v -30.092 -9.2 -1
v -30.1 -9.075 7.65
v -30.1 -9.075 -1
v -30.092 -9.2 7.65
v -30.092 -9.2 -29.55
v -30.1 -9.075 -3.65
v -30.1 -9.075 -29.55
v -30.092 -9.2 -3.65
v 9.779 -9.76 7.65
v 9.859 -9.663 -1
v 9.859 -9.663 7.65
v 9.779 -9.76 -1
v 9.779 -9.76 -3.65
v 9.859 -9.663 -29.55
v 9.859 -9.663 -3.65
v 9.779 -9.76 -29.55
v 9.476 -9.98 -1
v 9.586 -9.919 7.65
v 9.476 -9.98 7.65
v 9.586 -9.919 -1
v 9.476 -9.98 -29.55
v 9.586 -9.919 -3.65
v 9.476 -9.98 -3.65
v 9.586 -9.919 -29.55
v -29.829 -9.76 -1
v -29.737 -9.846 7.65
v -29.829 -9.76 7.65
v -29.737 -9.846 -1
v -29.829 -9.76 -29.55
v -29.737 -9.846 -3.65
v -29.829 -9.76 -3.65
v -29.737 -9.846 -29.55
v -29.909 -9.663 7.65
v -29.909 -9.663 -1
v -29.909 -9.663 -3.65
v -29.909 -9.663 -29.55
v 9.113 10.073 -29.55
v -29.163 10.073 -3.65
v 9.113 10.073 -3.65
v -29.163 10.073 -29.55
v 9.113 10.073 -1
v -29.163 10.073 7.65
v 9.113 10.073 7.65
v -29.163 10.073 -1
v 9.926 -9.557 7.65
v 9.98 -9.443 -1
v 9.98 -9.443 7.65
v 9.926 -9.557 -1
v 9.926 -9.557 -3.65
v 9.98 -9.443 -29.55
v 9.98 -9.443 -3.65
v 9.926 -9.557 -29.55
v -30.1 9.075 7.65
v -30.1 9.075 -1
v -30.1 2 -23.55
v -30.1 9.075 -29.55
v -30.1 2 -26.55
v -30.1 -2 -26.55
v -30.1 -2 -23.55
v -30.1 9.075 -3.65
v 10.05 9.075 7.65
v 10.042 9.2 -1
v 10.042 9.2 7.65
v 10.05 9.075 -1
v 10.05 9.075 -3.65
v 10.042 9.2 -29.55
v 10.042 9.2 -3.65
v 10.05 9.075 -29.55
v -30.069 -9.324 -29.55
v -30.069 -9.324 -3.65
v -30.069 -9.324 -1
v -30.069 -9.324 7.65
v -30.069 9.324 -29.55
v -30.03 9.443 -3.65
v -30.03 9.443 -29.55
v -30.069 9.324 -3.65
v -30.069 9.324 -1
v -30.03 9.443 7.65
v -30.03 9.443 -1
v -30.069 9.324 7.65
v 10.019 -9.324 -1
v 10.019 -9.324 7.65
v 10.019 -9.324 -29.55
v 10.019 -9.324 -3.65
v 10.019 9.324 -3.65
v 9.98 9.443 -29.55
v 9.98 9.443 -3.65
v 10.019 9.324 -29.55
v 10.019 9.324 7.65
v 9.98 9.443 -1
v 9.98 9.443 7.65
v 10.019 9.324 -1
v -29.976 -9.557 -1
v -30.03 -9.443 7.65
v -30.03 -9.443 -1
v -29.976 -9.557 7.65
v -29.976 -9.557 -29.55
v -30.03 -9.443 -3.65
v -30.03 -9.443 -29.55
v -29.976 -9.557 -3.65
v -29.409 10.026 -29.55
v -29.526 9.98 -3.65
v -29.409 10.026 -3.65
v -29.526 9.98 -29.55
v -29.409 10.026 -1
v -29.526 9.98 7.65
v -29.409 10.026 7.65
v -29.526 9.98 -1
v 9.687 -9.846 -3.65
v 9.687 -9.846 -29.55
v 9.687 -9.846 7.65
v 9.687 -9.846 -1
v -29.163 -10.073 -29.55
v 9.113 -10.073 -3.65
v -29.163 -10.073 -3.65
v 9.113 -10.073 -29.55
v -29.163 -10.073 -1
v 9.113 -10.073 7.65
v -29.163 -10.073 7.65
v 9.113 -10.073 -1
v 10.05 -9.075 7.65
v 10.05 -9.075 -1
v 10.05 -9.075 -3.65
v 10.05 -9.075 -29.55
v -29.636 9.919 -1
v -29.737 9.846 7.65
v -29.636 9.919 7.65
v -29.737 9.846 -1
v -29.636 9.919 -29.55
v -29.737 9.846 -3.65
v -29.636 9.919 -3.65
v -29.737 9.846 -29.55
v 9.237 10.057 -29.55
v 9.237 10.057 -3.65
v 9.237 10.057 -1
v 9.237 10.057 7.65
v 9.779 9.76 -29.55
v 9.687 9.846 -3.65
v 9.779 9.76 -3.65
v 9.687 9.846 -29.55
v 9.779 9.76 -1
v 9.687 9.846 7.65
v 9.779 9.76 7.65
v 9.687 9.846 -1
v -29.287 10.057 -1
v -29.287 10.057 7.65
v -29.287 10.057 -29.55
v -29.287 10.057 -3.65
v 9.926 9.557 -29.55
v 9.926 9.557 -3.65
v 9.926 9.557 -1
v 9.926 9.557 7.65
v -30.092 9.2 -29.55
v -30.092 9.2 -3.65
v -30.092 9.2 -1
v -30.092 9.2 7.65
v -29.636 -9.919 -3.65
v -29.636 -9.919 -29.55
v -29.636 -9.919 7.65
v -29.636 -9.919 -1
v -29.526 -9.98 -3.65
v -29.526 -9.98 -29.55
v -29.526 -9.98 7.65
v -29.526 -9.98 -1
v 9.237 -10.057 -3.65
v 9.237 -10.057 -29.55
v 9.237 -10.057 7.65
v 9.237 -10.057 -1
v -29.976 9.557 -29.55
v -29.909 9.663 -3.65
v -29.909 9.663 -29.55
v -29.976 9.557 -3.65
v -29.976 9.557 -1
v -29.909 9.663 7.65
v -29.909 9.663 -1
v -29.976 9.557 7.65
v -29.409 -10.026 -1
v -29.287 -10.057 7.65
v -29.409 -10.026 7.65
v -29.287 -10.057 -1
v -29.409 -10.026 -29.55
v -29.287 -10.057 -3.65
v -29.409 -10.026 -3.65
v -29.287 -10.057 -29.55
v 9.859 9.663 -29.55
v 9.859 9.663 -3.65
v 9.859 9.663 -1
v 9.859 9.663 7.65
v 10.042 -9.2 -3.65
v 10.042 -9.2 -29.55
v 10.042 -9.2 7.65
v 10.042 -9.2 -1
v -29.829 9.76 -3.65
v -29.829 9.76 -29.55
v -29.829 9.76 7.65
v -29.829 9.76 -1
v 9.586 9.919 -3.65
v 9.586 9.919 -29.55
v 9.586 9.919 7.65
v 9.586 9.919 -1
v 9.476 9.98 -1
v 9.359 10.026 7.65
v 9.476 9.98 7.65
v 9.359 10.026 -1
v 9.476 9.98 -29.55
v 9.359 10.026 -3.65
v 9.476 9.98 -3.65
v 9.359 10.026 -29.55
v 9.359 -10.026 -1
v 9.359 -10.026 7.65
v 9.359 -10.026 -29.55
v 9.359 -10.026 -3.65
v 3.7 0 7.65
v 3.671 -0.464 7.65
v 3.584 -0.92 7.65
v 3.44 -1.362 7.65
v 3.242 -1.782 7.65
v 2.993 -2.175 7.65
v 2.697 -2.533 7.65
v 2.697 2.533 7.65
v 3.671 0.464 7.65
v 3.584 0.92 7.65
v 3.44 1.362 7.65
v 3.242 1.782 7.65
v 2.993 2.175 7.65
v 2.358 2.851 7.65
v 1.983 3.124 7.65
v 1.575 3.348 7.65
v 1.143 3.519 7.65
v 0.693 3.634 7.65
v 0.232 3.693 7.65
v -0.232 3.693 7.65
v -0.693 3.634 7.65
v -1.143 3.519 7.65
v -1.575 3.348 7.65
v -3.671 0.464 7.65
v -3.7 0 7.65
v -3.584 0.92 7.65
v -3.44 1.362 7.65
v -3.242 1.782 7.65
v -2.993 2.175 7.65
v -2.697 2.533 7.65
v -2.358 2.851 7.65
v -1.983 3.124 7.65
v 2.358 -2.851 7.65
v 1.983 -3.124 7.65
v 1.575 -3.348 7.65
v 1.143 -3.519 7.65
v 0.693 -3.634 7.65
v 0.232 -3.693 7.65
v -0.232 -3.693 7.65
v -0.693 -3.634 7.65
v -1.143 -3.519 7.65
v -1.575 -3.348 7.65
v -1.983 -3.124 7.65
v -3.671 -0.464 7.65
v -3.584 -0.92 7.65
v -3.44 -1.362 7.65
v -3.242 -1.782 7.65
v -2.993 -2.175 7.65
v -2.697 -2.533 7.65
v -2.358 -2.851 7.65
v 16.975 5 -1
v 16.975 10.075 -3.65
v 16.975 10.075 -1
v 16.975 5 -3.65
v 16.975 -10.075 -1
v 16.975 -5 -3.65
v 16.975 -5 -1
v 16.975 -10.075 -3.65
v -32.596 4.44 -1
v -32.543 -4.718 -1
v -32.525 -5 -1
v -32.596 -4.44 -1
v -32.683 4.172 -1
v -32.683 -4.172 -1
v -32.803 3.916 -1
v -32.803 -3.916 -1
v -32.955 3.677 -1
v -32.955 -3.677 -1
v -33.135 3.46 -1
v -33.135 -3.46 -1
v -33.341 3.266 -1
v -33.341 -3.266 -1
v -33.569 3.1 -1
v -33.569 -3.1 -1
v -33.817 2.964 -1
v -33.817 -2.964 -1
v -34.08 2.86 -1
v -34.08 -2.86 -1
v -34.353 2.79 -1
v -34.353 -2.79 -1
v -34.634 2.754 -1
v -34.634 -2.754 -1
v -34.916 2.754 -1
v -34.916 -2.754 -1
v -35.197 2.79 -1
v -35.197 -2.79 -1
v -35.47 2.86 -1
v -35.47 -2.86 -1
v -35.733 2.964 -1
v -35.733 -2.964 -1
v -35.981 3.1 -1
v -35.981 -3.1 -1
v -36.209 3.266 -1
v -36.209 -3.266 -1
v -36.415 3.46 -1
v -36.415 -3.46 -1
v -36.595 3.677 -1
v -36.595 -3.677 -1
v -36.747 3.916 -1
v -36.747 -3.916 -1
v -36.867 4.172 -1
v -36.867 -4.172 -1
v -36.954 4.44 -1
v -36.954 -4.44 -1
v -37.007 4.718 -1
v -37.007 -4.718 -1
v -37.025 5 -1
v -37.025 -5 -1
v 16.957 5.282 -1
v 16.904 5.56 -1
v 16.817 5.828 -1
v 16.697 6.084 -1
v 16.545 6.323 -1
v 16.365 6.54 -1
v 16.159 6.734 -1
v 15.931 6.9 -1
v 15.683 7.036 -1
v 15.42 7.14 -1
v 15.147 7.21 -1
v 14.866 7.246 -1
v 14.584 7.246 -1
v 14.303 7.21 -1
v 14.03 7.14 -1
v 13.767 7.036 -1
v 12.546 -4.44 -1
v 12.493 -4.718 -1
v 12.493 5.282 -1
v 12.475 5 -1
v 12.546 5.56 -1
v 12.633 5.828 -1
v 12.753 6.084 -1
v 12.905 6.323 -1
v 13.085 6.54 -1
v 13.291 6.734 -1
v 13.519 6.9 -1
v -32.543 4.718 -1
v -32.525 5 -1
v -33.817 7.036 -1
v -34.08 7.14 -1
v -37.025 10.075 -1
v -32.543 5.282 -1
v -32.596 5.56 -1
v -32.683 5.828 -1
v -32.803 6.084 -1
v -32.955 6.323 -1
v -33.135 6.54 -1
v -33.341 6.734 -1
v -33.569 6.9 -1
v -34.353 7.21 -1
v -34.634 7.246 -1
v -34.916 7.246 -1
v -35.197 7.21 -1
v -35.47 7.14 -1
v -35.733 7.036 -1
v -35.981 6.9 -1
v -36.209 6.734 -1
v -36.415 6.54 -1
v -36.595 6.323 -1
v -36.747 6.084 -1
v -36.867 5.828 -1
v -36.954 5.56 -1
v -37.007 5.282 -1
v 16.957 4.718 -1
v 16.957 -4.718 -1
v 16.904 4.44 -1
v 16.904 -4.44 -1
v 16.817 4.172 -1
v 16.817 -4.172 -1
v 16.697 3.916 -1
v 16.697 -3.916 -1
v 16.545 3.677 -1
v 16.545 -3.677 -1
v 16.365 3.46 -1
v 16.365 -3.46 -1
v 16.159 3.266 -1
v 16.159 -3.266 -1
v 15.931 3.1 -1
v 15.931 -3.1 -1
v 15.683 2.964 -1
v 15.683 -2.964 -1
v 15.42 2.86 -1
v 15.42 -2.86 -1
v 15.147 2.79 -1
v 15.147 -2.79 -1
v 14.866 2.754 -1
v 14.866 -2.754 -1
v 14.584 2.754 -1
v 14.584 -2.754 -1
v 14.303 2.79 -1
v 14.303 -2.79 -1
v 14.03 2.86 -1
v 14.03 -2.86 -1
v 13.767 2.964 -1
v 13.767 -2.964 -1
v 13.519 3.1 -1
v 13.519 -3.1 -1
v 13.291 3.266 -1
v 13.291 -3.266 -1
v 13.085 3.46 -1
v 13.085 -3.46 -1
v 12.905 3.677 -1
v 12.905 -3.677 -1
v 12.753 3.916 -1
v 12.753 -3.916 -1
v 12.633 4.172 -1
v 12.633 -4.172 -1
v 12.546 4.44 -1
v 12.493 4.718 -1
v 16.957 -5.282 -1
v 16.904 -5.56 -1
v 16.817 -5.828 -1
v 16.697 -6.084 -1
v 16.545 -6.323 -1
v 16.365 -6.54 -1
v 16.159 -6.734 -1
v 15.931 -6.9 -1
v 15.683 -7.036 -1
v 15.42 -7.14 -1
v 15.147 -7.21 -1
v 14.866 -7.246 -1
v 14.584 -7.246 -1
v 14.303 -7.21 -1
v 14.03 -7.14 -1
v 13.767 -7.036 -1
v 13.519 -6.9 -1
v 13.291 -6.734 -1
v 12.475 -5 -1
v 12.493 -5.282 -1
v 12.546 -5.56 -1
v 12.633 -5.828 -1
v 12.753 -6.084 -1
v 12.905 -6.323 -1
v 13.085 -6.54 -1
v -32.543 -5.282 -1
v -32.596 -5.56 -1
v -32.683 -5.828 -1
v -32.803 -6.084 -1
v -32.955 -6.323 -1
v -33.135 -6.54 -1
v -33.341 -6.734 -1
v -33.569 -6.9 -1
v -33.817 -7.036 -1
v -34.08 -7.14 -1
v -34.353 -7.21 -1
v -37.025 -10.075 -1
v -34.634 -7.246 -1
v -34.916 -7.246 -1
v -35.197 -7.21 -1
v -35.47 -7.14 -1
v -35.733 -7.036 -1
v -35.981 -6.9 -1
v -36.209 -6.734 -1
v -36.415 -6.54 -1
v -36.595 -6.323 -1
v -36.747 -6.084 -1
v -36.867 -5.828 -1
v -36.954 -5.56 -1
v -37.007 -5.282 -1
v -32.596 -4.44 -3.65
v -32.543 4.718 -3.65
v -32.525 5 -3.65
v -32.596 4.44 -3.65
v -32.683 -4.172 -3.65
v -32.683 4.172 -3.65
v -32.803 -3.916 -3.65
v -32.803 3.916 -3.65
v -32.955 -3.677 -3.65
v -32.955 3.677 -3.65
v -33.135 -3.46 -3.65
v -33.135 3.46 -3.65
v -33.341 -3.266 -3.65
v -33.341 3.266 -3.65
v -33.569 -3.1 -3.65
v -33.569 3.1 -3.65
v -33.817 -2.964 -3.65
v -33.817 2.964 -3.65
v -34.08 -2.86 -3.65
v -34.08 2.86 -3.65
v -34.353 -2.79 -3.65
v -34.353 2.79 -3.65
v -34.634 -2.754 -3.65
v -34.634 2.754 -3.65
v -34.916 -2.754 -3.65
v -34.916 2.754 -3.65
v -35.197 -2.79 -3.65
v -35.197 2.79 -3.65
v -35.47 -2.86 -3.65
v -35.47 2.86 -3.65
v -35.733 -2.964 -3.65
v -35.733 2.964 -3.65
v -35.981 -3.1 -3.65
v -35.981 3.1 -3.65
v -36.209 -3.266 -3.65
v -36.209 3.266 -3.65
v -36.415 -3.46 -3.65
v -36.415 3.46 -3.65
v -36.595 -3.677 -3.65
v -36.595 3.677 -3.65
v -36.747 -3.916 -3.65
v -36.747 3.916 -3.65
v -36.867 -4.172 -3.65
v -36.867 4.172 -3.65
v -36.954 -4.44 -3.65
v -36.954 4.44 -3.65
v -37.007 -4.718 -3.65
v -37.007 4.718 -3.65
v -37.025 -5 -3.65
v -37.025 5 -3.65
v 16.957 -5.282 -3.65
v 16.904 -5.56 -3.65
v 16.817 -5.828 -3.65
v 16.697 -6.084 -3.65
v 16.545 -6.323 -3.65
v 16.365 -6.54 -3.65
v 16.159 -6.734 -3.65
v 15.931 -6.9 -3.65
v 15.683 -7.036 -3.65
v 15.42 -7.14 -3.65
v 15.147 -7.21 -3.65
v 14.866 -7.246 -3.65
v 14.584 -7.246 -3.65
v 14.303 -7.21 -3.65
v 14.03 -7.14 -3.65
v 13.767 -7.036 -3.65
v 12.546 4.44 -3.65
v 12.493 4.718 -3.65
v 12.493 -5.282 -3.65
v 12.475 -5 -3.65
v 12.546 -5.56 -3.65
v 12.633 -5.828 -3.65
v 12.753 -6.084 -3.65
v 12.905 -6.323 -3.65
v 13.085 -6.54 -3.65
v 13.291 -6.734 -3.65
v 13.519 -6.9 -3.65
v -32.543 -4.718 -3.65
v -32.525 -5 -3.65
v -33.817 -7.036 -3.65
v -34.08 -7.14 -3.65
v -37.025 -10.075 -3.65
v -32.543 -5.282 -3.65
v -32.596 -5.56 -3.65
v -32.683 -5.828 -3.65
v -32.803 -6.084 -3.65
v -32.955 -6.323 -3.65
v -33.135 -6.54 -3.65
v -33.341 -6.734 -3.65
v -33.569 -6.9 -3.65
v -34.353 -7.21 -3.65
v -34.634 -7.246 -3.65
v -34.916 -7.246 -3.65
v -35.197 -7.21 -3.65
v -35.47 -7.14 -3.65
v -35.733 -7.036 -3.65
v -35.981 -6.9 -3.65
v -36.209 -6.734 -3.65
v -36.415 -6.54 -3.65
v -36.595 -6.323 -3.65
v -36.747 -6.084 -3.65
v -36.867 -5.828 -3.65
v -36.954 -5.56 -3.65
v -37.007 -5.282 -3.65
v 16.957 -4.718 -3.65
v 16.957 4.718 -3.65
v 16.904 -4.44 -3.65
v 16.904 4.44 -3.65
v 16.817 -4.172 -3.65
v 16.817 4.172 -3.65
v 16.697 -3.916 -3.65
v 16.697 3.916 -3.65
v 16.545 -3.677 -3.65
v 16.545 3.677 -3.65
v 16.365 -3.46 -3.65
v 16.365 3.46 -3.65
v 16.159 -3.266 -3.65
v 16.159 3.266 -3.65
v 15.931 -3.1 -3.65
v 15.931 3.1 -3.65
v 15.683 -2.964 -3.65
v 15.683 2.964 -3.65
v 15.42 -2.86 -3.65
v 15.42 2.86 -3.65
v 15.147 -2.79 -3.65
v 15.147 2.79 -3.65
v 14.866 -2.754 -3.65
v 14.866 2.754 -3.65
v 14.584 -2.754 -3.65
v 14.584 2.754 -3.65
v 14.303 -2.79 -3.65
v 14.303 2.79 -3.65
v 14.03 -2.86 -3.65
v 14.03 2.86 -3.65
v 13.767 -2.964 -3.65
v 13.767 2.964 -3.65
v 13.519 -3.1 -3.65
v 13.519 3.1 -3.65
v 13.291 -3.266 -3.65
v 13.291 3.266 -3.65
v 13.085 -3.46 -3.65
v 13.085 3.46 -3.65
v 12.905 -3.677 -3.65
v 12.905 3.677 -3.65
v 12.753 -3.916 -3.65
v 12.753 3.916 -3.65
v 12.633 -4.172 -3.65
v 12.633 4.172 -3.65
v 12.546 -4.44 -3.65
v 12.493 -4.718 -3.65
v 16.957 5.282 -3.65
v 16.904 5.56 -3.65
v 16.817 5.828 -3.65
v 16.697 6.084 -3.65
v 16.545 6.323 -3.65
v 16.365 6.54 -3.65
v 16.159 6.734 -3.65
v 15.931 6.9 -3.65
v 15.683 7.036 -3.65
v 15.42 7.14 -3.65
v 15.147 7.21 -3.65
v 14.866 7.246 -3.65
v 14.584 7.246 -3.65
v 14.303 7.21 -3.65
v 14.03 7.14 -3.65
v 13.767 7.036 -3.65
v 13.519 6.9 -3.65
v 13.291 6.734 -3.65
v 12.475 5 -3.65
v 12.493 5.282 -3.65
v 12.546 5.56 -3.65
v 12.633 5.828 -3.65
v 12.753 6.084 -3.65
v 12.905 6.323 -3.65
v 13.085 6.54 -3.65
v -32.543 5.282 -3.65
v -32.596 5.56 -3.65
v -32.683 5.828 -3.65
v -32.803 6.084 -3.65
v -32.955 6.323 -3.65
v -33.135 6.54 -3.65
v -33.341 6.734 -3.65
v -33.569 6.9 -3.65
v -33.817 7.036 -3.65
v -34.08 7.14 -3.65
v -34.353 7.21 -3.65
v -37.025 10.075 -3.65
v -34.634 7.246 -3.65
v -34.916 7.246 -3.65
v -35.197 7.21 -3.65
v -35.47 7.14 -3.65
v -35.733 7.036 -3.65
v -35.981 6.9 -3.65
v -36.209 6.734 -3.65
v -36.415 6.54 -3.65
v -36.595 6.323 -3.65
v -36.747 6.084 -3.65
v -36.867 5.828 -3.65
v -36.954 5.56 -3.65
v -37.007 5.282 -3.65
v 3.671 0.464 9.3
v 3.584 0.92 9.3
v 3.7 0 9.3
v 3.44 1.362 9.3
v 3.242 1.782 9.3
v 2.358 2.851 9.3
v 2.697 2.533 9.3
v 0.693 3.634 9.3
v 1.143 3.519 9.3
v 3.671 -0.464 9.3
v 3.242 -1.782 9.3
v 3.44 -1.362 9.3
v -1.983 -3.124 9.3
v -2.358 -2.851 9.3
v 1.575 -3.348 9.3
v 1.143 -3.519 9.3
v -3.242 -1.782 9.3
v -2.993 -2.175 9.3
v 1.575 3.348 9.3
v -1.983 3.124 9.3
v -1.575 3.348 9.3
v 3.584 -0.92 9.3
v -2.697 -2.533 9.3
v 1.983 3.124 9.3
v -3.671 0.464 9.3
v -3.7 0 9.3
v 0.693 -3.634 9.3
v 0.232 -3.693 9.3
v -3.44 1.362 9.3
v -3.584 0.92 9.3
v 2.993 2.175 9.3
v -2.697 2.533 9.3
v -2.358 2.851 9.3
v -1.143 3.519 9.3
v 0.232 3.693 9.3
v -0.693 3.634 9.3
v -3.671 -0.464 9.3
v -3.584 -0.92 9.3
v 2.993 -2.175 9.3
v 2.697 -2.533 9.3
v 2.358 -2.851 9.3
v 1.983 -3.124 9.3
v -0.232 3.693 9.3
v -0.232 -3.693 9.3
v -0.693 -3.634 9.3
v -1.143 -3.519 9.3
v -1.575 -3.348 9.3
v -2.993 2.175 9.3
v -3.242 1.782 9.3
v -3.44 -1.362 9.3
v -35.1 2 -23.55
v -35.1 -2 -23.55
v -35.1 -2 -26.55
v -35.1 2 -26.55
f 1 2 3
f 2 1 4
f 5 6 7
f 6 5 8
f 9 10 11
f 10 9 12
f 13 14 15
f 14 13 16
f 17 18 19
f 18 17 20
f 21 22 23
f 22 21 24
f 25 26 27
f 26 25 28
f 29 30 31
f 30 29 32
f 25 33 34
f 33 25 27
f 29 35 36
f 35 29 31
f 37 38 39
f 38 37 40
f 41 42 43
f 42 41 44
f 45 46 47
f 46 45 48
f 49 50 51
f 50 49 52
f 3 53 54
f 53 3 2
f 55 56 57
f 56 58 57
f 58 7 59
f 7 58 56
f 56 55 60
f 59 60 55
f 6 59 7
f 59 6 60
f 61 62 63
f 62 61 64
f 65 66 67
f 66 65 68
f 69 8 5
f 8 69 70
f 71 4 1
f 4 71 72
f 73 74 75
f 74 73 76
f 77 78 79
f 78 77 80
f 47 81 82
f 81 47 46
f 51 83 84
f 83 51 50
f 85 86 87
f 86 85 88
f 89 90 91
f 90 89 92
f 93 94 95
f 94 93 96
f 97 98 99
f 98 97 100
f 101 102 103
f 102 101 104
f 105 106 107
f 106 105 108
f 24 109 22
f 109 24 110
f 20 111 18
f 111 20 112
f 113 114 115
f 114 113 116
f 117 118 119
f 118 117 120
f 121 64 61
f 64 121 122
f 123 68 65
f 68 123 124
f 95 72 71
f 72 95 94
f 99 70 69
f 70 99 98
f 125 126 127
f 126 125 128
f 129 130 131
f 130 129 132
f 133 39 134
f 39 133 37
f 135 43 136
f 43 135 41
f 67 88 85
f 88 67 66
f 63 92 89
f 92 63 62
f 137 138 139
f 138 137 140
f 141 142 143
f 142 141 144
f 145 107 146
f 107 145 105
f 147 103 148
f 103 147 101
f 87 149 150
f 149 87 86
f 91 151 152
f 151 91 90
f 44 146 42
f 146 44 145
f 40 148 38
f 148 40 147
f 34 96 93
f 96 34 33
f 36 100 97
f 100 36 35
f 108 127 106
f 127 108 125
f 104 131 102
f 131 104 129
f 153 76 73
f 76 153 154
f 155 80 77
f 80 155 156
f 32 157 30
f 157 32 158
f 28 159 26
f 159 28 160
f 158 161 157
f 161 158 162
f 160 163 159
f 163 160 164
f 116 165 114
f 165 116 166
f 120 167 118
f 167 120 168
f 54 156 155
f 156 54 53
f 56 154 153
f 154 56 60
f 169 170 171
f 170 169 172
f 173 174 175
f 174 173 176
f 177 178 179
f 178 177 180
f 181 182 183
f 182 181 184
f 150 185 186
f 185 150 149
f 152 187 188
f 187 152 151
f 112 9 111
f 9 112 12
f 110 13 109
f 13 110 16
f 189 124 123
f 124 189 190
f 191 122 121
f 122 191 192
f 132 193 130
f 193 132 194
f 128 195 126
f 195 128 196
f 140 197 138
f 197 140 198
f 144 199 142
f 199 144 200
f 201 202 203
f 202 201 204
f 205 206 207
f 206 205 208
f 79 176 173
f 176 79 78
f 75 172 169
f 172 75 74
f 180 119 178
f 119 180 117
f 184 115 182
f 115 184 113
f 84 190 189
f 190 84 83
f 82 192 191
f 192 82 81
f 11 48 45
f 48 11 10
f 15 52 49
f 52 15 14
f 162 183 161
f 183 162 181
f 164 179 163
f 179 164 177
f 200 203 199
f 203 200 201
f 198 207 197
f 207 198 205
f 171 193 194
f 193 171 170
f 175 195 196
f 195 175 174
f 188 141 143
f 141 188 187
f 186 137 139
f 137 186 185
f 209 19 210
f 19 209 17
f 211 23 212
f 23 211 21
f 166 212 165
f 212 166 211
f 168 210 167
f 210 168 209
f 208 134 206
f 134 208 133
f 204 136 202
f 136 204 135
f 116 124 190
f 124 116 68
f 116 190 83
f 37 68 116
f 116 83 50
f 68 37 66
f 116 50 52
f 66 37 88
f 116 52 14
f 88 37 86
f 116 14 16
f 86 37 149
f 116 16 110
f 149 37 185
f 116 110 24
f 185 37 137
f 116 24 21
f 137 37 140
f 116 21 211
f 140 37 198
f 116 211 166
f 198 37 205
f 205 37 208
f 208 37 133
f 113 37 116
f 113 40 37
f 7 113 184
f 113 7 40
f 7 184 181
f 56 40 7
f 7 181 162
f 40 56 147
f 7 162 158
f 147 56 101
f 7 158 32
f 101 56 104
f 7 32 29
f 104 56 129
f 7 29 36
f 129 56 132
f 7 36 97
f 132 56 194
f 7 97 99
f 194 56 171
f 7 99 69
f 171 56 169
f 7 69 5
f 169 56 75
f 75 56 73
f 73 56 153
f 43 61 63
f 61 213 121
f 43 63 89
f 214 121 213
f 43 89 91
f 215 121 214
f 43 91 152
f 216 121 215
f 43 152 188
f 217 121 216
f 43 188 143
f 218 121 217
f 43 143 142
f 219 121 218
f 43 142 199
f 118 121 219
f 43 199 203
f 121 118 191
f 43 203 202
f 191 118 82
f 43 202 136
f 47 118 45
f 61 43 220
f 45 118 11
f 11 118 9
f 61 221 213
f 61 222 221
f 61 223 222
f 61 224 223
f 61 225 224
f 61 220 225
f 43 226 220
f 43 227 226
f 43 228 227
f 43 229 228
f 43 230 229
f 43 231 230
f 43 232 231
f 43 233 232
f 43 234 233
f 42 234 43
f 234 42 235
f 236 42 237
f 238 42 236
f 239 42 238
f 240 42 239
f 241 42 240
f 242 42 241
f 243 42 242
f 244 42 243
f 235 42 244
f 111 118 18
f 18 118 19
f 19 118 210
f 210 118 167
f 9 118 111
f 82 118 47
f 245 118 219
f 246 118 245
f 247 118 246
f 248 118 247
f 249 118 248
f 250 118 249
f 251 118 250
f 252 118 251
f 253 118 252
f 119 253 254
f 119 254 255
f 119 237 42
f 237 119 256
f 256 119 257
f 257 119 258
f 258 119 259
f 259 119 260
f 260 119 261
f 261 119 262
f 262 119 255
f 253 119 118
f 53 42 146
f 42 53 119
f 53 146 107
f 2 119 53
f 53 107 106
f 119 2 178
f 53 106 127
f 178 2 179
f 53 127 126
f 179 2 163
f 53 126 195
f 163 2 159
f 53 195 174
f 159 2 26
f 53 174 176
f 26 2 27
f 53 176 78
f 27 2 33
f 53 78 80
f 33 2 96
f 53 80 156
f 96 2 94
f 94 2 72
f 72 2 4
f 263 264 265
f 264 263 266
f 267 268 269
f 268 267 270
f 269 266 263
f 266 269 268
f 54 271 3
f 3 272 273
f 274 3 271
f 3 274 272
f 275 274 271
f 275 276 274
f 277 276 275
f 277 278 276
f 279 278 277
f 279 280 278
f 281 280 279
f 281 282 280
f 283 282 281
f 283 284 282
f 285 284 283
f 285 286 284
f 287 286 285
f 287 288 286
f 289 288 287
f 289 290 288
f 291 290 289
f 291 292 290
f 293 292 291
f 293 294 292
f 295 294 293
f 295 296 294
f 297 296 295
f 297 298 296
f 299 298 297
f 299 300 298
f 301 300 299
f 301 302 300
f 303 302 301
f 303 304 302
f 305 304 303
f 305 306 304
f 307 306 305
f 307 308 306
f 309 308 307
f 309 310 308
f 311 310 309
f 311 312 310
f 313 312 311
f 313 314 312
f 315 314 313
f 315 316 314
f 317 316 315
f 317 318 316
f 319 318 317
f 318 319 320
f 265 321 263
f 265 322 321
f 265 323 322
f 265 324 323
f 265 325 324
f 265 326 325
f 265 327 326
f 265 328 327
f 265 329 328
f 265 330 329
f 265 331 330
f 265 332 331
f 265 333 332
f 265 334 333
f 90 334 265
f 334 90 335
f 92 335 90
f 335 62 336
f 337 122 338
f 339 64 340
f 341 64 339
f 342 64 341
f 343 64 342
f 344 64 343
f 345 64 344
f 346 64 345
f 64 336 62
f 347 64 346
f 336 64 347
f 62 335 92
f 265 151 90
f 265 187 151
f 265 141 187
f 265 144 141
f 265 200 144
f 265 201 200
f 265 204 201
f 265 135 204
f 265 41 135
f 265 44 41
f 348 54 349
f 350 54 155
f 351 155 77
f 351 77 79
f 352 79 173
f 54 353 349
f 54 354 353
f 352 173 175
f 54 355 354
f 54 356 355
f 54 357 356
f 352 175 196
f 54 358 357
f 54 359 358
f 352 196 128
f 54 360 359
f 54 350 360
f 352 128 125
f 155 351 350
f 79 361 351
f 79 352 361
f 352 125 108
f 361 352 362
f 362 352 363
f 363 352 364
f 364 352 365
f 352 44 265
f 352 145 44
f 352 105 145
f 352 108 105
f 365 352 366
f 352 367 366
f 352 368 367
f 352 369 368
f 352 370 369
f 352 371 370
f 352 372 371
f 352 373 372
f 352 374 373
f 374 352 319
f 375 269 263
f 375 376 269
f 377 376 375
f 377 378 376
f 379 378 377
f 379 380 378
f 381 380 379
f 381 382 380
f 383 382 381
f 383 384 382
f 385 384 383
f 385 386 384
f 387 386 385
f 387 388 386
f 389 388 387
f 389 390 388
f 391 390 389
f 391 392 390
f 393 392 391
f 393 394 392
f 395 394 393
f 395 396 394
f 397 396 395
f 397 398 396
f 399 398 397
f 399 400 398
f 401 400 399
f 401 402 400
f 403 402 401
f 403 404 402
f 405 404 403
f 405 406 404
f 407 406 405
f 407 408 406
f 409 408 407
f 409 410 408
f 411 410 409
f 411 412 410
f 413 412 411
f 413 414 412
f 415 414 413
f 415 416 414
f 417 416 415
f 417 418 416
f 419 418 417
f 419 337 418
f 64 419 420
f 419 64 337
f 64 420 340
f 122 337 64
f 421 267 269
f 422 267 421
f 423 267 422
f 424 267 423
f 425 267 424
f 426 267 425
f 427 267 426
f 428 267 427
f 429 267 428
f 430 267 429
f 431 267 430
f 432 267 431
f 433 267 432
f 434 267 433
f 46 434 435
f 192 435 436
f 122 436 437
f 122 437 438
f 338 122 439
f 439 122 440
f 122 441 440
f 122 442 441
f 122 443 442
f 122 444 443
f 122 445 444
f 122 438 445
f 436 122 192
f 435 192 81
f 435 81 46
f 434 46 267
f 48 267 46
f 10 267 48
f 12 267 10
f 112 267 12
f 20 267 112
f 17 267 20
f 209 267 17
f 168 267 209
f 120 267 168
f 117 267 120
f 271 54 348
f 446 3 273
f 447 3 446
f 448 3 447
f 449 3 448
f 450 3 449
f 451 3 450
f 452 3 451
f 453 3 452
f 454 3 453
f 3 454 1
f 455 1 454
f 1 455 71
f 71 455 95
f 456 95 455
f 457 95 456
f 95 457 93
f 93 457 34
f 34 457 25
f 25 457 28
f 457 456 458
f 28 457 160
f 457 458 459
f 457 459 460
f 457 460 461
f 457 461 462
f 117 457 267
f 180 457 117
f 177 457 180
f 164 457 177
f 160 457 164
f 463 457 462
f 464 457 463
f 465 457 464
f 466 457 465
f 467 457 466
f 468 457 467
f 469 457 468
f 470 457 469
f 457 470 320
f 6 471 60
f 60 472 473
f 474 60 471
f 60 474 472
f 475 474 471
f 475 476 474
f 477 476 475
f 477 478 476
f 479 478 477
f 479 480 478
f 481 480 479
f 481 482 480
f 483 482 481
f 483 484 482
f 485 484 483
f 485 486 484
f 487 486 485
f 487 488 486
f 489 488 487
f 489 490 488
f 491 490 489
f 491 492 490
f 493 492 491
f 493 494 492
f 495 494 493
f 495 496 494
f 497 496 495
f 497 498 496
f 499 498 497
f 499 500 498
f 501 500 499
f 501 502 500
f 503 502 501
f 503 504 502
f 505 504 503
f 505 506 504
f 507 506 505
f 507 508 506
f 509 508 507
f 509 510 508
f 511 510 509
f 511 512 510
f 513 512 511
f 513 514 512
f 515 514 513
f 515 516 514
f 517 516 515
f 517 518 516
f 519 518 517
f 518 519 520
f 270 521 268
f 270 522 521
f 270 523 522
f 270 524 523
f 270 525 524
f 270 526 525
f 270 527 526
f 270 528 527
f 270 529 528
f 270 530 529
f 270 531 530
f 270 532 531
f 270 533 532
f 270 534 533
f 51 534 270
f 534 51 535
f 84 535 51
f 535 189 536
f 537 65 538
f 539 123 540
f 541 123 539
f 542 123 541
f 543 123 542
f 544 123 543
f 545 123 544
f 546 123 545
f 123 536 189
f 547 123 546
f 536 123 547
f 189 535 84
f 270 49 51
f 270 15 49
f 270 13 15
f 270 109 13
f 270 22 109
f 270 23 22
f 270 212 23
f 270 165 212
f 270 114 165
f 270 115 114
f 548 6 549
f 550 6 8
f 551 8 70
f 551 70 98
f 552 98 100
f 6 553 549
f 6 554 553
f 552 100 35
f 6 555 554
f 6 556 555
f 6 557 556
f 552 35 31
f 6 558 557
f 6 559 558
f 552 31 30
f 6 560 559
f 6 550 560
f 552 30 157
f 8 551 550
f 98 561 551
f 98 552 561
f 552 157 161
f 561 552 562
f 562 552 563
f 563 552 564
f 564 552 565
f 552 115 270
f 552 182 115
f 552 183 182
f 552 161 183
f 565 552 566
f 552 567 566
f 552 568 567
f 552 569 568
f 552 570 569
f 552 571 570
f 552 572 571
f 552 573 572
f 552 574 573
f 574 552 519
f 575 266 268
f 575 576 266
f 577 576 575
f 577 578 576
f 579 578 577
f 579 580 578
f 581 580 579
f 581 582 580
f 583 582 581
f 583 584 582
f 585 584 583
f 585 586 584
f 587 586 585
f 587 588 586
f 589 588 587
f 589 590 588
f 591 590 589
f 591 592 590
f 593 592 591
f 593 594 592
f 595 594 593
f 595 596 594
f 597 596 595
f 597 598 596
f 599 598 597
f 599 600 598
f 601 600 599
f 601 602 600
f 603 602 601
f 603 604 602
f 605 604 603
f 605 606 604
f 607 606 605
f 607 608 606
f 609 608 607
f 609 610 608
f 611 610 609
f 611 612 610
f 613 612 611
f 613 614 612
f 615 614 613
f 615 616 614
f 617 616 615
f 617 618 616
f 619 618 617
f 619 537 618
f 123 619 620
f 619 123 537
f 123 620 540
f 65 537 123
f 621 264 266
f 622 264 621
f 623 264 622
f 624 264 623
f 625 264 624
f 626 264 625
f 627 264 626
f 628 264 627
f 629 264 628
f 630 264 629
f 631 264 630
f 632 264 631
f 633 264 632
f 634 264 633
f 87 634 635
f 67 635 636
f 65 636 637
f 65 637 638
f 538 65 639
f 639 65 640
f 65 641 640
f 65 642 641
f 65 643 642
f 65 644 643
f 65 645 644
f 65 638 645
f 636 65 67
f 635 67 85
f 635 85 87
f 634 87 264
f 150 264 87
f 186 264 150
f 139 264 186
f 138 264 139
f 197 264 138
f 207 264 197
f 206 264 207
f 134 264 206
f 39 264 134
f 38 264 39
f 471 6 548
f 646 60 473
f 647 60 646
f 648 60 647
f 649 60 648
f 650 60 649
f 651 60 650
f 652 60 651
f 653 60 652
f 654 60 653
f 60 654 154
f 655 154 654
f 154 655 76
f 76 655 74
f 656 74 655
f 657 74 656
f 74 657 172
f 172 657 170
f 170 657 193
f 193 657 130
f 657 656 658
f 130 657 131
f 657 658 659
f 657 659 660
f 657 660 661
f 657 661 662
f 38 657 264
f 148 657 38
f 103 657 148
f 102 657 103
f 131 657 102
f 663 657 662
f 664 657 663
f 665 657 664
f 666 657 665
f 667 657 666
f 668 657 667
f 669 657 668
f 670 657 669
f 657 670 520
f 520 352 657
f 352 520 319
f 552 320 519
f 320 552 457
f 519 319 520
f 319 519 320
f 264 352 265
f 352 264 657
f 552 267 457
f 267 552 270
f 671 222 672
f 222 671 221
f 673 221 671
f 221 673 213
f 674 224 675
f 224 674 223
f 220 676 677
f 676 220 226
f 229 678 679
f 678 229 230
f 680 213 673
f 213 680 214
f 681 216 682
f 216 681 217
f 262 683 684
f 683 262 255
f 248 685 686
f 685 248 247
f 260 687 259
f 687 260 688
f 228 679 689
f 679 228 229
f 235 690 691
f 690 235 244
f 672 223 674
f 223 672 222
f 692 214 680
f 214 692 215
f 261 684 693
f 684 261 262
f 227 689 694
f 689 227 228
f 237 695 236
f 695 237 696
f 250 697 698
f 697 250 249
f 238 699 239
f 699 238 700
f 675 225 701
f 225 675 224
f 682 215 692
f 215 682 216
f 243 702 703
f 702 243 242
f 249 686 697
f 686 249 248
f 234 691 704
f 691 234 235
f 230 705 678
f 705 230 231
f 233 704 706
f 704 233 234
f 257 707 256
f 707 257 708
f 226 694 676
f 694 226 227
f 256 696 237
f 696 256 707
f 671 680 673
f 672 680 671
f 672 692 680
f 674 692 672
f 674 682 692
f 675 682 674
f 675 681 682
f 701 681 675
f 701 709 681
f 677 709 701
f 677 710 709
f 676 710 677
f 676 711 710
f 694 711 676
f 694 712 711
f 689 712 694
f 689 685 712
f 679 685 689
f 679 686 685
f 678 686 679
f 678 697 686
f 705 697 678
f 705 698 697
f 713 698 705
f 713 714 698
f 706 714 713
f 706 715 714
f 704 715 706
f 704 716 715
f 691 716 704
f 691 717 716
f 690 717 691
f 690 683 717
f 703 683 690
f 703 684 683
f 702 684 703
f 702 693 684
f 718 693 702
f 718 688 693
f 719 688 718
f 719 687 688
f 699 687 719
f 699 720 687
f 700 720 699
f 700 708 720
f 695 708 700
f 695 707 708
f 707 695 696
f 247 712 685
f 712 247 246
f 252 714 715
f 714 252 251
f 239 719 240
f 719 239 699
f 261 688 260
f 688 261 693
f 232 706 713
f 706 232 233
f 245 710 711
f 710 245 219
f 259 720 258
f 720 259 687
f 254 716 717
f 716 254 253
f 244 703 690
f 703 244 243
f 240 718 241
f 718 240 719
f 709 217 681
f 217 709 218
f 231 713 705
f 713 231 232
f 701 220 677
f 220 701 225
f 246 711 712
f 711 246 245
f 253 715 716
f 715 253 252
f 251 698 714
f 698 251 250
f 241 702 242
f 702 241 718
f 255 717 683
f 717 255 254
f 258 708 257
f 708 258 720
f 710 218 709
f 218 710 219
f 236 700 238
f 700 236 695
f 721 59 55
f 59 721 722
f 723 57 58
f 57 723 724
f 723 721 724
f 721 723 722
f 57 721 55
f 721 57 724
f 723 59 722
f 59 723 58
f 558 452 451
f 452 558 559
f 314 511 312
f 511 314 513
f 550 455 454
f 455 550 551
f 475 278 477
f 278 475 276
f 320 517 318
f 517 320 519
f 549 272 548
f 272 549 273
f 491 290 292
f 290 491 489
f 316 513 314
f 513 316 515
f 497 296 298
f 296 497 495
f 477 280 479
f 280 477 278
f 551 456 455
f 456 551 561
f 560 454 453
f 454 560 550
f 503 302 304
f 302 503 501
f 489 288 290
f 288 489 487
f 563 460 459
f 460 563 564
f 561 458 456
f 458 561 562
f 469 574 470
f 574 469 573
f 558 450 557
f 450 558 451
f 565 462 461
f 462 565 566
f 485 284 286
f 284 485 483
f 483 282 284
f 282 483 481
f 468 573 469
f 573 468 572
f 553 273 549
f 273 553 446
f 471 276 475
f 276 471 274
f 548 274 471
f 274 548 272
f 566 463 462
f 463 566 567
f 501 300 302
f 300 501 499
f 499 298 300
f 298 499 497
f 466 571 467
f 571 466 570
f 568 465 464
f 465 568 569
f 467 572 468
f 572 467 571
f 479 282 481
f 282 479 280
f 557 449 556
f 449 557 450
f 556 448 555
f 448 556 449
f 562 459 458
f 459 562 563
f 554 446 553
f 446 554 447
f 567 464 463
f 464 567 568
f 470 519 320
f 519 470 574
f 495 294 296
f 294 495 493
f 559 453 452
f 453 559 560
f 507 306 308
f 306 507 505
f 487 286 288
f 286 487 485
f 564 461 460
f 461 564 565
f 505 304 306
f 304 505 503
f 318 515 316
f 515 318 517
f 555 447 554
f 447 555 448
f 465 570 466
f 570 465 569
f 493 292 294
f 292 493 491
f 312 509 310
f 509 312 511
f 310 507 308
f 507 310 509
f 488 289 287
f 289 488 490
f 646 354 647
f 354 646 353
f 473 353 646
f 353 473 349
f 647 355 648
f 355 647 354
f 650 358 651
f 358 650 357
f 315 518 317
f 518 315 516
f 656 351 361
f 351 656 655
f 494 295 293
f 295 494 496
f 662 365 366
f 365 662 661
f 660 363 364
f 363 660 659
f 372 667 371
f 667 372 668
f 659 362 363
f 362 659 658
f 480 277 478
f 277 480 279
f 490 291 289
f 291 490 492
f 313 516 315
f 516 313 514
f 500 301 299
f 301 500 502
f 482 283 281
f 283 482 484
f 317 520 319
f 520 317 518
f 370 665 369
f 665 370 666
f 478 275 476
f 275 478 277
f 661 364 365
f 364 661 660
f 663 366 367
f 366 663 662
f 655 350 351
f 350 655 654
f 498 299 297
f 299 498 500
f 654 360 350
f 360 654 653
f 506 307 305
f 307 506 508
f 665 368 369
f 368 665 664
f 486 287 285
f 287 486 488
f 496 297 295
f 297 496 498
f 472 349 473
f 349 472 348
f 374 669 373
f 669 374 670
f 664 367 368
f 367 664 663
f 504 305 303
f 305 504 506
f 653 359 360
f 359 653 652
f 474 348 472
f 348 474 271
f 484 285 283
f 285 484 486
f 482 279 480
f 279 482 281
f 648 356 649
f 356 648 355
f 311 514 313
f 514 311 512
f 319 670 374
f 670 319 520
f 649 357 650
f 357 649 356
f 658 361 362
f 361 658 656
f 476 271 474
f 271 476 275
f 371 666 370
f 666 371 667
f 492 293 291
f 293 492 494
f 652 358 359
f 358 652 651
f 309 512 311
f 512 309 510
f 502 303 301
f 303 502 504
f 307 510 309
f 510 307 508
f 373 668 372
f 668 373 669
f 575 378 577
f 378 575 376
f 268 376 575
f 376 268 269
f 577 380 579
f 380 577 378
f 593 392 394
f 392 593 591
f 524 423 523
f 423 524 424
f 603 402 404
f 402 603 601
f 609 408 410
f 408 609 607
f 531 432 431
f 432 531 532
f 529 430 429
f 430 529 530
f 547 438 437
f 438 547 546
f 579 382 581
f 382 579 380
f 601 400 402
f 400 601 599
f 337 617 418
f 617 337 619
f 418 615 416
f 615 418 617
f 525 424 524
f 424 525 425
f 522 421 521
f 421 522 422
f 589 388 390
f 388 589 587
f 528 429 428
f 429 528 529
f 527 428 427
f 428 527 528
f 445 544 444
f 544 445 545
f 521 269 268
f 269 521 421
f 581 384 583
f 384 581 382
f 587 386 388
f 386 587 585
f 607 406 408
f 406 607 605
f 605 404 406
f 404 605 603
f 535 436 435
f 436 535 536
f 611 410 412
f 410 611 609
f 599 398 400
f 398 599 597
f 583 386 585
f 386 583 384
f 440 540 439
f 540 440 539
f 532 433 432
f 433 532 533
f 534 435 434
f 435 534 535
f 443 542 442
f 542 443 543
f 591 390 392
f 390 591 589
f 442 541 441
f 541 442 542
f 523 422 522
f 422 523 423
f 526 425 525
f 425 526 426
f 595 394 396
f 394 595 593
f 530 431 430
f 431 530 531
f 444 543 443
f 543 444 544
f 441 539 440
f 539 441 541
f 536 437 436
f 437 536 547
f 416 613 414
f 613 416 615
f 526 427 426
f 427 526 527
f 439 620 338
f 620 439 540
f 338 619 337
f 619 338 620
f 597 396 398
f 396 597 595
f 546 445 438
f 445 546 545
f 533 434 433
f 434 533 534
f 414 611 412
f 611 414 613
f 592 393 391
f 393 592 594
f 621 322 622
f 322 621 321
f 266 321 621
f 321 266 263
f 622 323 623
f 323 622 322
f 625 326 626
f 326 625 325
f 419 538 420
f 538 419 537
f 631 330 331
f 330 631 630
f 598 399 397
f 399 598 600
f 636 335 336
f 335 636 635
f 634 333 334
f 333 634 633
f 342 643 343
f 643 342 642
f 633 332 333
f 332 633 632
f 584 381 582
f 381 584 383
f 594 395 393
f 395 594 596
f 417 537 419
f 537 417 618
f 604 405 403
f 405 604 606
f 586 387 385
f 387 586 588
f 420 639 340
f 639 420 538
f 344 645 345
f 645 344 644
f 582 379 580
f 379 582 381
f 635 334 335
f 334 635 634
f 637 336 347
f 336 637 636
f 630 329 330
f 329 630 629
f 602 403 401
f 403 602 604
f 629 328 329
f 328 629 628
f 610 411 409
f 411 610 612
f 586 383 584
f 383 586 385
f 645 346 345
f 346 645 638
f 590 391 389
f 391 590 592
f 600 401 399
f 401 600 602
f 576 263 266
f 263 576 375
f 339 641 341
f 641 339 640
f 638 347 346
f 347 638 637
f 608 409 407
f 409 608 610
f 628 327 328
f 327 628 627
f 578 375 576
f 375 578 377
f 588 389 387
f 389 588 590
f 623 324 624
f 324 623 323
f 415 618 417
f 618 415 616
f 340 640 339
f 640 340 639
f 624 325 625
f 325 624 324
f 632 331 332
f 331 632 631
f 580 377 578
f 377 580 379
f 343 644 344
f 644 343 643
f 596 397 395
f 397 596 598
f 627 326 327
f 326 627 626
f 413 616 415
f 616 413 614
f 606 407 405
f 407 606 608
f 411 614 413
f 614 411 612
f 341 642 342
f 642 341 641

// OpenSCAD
$fn = 50;

difference() {
	union() {
		translate(v = [-10.024999999999999, 0, -29.550000000000004]) {
			hull() {
				translate(v = [-19.075, 9.075, 0]) {
					cylinder(h = 37.2, r = 1);
				}
				translate(v = [19.075, 9.075, 0]) {
					cylinder(h = 37.2, r = 1);
				}
				translate(v = [-19.075, -9.075, 0]) {
					cylinder(h = 37.2, r = 1);
				}
				translate(v = [19.075, -9.075, 0]) {
					cylinder(h = 37.2, r = 1);
				}
			}
		}
		translate(v = [-37.025, -10.075, -3.65]) {
			cube(size = [54.0, 20.15, 2.65]);
		}
		translate(v = [0, 0, 7.65]) {
			cylinder(h = 1.6500000000000004, r = 3.7);
		}
		translate(v = [-35.099999999999994, -2.0, -26.550000000000004]) {
			cube(size = [6, 4, 3]);
		}
	}
	union() {
		translate(v = [-34.775, -5.0, -5]) {
			cylinder(h = 5, r = 2.25);
		}
		translate(v = [-34.775, 5.0, -5]) {
			cylinder(h = 5, r = 2.25);
		}
		translate(v = [14.725000000000001, -5.0, -5]) {
			cylinder(h = 5, r = 2.25);
		}
		translate(v = [14.725000000000001, 5.0, -5]) {
			cylinder(h = 5, r = 2.25);
		}
	}
}
